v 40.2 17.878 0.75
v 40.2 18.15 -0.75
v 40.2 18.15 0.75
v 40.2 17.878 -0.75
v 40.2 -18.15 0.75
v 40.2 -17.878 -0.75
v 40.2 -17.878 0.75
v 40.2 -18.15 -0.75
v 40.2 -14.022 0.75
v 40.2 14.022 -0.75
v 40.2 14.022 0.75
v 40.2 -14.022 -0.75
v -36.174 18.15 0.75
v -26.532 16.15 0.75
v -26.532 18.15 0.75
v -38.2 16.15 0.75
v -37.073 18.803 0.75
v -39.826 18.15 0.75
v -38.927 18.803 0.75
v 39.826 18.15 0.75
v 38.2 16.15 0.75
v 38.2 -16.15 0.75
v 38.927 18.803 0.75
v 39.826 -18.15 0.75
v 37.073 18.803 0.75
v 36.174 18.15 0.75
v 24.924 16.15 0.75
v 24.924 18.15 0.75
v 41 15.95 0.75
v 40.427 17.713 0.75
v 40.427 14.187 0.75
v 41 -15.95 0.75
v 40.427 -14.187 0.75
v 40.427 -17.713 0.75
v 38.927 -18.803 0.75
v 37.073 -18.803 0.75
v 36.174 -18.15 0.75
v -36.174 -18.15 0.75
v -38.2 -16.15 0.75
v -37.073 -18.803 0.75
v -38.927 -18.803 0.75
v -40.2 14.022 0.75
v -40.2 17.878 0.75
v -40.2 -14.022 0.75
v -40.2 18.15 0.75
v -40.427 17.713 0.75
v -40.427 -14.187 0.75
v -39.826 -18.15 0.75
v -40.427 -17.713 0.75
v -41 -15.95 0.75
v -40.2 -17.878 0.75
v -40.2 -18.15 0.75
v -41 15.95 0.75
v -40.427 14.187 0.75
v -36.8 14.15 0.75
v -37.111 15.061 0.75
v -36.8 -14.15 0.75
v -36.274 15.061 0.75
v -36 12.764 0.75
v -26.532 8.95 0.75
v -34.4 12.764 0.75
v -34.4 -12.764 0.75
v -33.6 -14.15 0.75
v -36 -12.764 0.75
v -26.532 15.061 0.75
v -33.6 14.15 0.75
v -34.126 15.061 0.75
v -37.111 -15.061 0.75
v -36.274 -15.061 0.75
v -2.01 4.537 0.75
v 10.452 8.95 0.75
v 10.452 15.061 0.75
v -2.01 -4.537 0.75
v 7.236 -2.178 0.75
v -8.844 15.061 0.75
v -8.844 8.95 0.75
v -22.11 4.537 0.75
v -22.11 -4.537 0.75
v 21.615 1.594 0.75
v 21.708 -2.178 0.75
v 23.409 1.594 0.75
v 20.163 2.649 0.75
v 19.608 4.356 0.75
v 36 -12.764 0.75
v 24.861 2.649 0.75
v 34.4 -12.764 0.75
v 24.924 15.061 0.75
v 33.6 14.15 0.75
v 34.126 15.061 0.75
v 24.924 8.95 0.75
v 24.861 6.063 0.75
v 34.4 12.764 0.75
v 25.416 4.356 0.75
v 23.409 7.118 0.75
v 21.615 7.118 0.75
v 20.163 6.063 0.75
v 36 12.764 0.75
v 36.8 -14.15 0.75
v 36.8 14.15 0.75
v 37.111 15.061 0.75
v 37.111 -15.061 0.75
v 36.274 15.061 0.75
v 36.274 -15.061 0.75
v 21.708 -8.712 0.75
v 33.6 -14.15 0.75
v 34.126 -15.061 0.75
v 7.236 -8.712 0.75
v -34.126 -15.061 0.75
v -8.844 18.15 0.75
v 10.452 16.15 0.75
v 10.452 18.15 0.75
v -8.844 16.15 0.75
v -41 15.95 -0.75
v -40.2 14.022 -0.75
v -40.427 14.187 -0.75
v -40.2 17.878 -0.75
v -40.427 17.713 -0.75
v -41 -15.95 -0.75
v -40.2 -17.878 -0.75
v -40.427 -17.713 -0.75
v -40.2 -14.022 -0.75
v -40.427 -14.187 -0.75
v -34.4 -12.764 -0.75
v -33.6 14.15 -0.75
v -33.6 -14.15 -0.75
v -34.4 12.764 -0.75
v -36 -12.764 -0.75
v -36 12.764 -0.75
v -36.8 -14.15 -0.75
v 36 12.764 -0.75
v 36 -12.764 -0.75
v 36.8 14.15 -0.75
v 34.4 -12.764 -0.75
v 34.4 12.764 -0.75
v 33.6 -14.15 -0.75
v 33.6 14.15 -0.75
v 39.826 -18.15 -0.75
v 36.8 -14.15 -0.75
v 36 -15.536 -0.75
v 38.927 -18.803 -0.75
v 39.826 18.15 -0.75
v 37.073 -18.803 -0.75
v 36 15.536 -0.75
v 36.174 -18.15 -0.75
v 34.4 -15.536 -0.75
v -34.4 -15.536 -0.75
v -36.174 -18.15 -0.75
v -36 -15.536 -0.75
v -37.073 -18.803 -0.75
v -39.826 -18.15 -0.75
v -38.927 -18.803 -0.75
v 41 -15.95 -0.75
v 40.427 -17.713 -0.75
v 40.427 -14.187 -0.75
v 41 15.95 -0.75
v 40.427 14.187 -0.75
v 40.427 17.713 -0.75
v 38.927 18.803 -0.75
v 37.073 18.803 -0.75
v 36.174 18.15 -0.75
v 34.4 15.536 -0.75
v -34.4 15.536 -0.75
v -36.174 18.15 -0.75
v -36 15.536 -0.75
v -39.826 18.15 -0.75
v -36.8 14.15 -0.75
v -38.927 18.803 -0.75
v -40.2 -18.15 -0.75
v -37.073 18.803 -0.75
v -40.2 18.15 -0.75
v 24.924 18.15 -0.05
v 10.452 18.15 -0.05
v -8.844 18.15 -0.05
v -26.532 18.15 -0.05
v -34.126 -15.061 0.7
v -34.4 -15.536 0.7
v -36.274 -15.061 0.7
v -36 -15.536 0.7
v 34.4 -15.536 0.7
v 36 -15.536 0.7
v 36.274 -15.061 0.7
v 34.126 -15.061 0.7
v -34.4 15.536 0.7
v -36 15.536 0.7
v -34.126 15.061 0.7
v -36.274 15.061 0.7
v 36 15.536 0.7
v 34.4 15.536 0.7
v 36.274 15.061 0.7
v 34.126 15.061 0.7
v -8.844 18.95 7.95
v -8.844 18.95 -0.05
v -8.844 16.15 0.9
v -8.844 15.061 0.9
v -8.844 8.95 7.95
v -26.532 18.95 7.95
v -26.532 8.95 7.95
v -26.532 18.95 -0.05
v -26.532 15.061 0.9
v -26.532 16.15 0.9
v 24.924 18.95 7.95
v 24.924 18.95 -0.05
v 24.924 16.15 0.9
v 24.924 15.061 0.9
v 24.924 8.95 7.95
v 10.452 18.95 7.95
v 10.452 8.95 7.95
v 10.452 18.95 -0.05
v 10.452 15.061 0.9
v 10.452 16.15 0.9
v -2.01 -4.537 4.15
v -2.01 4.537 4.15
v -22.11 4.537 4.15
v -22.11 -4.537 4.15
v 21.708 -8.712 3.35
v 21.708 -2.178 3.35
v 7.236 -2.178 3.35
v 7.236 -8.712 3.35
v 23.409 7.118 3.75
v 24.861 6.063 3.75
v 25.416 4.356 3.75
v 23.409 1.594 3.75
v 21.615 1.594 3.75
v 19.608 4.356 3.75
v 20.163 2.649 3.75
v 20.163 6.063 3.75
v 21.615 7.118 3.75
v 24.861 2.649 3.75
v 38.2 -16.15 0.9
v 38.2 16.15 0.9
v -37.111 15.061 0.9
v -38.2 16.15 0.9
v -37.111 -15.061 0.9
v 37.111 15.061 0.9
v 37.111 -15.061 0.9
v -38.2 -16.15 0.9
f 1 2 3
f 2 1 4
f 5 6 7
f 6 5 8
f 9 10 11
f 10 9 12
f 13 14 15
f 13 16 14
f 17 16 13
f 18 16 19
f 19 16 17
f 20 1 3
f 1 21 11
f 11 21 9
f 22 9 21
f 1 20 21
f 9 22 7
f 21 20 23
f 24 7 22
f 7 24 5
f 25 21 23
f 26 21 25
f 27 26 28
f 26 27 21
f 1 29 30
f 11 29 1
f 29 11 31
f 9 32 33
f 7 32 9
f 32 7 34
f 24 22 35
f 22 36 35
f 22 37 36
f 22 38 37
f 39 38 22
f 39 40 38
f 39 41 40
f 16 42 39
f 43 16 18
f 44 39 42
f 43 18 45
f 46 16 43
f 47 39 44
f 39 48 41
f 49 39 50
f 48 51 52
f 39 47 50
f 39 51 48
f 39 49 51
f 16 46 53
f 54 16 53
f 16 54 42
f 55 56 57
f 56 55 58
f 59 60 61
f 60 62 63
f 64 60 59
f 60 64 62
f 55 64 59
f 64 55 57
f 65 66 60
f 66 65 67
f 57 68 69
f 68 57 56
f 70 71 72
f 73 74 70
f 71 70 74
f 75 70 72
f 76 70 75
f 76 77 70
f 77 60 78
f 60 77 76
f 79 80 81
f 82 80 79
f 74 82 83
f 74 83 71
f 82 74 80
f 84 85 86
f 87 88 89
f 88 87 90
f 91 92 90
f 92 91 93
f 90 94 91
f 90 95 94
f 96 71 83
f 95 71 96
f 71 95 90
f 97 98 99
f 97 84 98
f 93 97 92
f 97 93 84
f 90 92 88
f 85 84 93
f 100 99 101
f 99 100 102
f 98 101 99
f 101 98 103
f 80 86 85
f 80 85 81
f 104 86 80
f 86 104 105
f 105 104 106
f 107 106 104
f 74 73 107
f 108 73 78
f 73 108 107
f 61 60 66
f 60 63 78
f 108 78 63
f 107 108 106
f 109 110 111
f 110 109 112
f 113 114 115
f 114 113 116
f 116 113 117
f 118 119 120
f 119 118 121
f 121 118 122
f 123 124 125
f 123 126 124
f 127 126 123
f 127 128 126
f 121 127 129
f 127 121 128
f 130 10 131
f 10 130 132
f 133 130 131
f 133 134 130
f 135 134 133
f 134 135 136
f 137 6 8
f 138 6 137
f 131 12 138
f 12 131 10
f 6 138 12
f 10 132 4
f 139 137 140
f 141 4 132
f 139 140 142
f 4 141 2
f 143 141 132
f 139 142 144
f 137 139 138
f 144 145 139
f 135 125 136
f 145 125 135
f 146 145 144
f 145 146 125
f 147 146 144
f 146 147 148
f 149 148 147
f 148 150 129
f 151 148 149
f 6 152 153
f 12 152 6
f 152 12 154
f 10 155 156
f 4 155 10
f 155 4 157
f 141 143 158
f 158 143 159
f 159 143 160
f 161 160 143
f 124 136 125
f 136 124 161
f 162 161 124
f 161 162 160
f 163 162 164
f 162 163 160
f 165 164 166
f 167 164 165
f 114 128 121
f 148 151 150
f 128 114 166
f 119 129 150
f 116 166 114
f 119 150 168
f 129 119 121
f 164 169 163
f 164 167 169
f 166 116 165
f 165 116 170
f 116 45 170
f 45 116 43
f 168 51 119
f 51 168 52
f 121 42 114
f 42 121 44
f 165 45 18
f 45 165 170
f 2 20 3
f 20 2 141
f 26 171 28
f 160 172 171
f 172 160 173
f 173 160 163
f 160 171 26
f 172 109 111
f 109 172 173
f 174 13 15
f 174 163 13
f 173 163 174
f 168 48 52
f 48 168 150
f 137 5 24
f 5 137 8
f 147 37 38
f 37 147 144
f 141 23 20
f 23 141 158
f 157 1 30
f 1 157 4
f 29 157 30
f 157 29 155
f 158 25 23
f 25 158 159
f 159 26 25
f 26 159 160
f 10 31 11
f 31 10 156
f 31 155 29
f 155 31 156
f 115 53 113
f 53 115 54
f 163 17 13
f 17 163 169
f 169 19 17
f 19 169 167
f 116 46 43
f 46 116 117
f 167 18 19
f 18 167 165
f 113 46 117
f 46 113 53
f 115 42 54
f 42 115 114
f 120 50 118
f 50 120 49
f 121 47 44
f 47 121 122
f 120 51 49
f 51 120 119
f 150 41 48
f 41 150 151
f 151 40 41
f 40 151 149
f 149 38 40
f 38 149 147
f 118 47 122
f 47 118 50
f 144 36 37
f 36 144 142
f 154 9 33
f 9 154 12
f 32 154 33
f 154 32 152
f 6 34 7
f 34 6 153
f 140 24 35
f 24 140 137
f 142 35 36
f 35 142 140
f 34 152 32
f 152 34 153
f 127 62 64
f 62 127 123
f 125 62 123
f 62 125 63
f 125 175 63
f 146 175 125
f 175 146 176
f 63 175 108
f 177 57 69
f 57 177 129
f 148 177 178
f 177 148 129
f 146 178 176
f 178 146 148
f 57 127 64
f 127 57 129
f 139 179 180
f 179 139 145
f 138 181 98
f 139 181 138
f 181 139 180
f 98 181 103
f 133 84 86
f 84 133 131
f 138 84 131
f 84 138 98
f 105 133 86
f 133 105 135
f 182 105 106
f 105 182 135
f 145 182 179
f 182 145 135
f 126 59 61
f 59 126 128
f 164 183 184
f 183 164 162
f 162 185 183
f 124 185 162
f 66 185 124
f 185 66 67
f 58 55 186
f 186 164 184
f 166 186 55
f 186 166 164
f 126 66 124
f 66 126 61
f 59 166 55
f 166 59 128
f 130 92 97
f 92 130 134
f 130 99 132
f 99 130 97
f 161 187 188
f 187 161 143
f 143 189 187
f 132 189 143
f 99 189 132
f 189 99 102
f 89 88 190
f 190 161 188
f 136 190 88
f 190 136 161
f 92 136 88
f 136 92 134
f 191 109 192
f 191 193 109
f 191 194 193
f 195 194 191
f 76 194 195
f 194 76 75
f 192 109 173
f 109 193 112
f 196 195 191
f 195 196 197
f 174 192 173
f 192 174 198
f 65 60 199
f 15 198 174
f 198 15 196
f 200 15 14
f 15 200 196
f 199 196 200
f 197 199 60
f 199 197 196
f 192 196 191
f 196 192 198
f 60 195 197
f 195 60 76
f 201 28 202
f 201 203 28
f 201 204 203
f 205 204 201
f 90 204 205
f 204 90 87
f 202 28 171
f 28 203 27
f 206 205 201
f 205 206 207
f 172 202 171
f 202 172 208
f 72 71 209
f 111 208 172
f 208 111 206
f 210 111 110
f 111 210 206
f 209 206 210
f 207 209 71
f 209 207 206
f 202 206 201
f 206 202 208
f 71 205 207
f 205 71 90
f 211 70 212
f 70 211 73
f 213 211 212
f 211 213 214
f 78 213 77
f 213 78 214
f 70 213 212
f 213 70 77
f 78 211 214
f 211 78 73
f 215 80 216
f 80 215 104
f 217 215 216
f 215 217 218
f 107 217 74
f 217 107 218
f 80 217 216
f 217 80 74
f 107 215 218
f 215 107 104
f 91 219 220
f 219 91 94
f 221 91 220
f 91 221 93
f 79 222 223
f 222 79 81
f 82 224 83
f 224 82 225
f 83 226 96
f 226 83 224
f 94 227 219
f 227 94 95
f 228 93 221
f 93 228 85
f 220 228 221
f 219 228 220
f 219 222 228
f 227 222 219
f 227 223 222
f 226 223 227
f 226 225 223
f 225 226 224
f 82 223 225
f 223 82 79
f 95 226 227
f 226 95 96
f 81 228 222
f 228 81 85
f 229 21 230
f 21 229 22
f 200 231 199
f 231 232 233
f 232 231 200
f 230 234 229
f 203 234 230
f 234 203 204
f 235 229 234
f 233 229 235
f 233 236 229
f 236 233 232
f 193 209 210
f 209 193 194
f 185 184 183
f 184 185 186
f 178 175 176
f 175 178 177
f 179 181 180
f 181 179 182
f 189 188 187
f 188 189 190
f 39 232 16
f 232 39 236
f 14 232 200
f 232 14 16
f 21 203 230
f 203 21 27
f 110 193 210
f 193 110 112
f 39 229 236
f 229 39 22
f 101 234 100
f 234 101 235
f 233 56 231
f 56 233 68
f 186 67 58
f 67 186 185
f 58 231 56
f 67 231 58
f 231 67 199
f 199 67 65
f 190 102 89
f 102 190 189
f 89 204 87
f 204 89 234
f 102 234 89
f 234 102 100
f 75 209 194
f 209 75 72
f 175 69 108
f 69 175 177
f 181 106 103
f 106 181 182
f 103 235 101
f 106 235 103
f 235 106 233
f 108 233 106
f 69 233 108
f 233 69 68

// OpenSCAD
// Parameters
pcb_length = 80.4; //[40.2:160.8:0.1]
pcb_width = 36.3; //[18.15:72.6:0.1]
pcb_thickness = 1.5; //[0.8:3:0.1]
corner_radius = 3; //[1.5:6:0.1]
corner_overlap = 0.8; //[0.5:2:0.1]
mount_hole_diameter = 3.2; //[2:5:0.1]
mount_hole_edge_margin_x = 5; //[2.5:10:0.1]
mount_hole_edge_margin_y = 4; //[2:8:0.1]
connector_height = 8; //[4:16:0.1]
connector_depth = 10; //[5:20:0.1]
connector_overlap = 0.8; //[0.5:2:0.1]
component_height = 4; //[2:10:0.1]
component_overlap = 0.6; //[0.5:2:0.1]
silkscreen_thickness = 0.2; //[0.1:0.6:0.05]
silkscreen_overlap = 0.05; //[0.02:0.2:0.01]
silkscreen_margin = 2; //[1:6:0.1]

// Main PCB with rounded corners
module pcb_main_body() {
  color([0.0, 0.4, 0.2]) // Green PCB
  difference() {
    union() {
      translate([0, 0, 0])
        cube([pcb_length, pcb_width, pcb_thickness], center=true);
      translate([pcb_length/2 - corner_radius + corner_overlap, pcb_width/2 - corner_radius + corner_overlap, 0])
        cylinder(r=corner_radius, h=pcb_thickness, center=true);
      translate([-pcb_length/2 + corner_radius - corner_overlap, pcb_width/2 - corner_radius + corner_overlap, 0])
        cylinder(r=corner_radius, h=pcb_thickness, center=true);
      translate([-pcb_length/2 + corner_radius - corner_overlap, -pcb_width/2 + corner_radius - corner_overlap, 0])
        cylinder(r=corner_radius, h=pcb_thickness, center=true);
      translate([pcb_length/2 - corner_radius + corner_overlap, -pcb_width/2 + corner_radius - corner_overlap, 0])
        cylinder(r=corner_radius, h=pcb_thickness, center=true);
    }
    // Mounting holes
    translate([-pcb_length/2 + mount_hole_edge_margin_x, -pcb_width/2 + mount_hole_edge_margin_y, 0])
      cylinder(r=mount_hole_diameter/2, h=pcb_thickness + 2, center=true);
    translate([pcb_length/2 - mount_hole_edge_margin_x, -pcb_width/2 + mount_hole_edge_margin_y, 0])
      cylinder(r=mount_hole_diameter/2, h=pcb_thickness + 2, center=true);
    translate([-pcb_length/2 + mount_hole_edge_margin_x, pcb_width/2 - mount_hole_edge_margin_y, 0])
      cylinder(r=mount_hole_diameter/2, h=pcb_thickness + 2, center=true);
    translate([pcb_length/2 - mount_hole_edge_margin_x, pcb_width/2 - mount_hole_edge_margin_y, 0])
      cylinder(r=mount_hole_diameter/2, h=pcb_thickness + 2, center=true);
  }
}

// Connectors
module connectors() {
  color([0.1, 0.1, 0.6]) // Blue connectors
  union() {
    translate([-pcb_length*0.22, pcb_width/2 - connector_depth/2 + connector_overlap, pcb_thickness/2 + connector_height/2 - connector_overlap])
      cube([pcb_length*0.22, connector_depth, connector_height], center=true);
    translate([pcb_length*0.22, pcb_width/2 - connector_depth/2 + connector_overlap, pcb_thickness/2 + connector_height/2 - connector_overlap])
      cube([pcb_length*0.18, connector_depth, connector_height], center=true);
  }
}

// Components
module components() {
  color([0.85, 0.85, 0.8]) // Off-white components
  union() {
    translate([-pcb_length*0.15, 0, pcb_thickness/2 + component_height/2 - component_overlap])
      cube([pcb_length*0.25, pcb_width*0.25, component_height], center=true);
    translate([pcb_length*0.18, -pcb_width*0.15, pcb_thickness/2 + (component_height*0.8)/2 - component_overlap])
      cube([pcb_length*0.18, pcb_width*0.18, component_height*0.8], center=true);
    translate([pcb_length*0.28, pcb_width*0.12, pcb_thickness/2 + (component_height*0.9)/2 - component_overlap])
      cylinder(r=pcb_width*0.08, h=component_height*0.9, center=true);
  }
}

// Silkscreen
module silkscreen() {
  color([1, 1, 1]) // White silkscreen
  difference() {
    translate([0, 0, pcb_thickness/2 + silkscreen_thickness/2 - silkscreen_overlap])
      cube([pcb_length - 2*silkscreen_margin, pcb_width - 2*silkscreen_margin, silkscreen_thickness], center=true);
    translate([0, 0, pcb_thickness/2 + silkscreen_thickness/2 - silkscreen_overlap])
      cube([pcb_length - 2*(silkscreen_margin + pcb_width*0.03), pcb_width - 2*(silkscreen_margin + pcb_width*0.03), silkscreen_thickness + 2*silkscreen_overlap], center=true);
  }
}

// Complete Mainboard
module complete_mainboard() {
  union() {
    pcb_main_body();
    connectors();
    components();
    silkscreen();
  }
}

// Render the complete mainboard
complete_mainboard();
